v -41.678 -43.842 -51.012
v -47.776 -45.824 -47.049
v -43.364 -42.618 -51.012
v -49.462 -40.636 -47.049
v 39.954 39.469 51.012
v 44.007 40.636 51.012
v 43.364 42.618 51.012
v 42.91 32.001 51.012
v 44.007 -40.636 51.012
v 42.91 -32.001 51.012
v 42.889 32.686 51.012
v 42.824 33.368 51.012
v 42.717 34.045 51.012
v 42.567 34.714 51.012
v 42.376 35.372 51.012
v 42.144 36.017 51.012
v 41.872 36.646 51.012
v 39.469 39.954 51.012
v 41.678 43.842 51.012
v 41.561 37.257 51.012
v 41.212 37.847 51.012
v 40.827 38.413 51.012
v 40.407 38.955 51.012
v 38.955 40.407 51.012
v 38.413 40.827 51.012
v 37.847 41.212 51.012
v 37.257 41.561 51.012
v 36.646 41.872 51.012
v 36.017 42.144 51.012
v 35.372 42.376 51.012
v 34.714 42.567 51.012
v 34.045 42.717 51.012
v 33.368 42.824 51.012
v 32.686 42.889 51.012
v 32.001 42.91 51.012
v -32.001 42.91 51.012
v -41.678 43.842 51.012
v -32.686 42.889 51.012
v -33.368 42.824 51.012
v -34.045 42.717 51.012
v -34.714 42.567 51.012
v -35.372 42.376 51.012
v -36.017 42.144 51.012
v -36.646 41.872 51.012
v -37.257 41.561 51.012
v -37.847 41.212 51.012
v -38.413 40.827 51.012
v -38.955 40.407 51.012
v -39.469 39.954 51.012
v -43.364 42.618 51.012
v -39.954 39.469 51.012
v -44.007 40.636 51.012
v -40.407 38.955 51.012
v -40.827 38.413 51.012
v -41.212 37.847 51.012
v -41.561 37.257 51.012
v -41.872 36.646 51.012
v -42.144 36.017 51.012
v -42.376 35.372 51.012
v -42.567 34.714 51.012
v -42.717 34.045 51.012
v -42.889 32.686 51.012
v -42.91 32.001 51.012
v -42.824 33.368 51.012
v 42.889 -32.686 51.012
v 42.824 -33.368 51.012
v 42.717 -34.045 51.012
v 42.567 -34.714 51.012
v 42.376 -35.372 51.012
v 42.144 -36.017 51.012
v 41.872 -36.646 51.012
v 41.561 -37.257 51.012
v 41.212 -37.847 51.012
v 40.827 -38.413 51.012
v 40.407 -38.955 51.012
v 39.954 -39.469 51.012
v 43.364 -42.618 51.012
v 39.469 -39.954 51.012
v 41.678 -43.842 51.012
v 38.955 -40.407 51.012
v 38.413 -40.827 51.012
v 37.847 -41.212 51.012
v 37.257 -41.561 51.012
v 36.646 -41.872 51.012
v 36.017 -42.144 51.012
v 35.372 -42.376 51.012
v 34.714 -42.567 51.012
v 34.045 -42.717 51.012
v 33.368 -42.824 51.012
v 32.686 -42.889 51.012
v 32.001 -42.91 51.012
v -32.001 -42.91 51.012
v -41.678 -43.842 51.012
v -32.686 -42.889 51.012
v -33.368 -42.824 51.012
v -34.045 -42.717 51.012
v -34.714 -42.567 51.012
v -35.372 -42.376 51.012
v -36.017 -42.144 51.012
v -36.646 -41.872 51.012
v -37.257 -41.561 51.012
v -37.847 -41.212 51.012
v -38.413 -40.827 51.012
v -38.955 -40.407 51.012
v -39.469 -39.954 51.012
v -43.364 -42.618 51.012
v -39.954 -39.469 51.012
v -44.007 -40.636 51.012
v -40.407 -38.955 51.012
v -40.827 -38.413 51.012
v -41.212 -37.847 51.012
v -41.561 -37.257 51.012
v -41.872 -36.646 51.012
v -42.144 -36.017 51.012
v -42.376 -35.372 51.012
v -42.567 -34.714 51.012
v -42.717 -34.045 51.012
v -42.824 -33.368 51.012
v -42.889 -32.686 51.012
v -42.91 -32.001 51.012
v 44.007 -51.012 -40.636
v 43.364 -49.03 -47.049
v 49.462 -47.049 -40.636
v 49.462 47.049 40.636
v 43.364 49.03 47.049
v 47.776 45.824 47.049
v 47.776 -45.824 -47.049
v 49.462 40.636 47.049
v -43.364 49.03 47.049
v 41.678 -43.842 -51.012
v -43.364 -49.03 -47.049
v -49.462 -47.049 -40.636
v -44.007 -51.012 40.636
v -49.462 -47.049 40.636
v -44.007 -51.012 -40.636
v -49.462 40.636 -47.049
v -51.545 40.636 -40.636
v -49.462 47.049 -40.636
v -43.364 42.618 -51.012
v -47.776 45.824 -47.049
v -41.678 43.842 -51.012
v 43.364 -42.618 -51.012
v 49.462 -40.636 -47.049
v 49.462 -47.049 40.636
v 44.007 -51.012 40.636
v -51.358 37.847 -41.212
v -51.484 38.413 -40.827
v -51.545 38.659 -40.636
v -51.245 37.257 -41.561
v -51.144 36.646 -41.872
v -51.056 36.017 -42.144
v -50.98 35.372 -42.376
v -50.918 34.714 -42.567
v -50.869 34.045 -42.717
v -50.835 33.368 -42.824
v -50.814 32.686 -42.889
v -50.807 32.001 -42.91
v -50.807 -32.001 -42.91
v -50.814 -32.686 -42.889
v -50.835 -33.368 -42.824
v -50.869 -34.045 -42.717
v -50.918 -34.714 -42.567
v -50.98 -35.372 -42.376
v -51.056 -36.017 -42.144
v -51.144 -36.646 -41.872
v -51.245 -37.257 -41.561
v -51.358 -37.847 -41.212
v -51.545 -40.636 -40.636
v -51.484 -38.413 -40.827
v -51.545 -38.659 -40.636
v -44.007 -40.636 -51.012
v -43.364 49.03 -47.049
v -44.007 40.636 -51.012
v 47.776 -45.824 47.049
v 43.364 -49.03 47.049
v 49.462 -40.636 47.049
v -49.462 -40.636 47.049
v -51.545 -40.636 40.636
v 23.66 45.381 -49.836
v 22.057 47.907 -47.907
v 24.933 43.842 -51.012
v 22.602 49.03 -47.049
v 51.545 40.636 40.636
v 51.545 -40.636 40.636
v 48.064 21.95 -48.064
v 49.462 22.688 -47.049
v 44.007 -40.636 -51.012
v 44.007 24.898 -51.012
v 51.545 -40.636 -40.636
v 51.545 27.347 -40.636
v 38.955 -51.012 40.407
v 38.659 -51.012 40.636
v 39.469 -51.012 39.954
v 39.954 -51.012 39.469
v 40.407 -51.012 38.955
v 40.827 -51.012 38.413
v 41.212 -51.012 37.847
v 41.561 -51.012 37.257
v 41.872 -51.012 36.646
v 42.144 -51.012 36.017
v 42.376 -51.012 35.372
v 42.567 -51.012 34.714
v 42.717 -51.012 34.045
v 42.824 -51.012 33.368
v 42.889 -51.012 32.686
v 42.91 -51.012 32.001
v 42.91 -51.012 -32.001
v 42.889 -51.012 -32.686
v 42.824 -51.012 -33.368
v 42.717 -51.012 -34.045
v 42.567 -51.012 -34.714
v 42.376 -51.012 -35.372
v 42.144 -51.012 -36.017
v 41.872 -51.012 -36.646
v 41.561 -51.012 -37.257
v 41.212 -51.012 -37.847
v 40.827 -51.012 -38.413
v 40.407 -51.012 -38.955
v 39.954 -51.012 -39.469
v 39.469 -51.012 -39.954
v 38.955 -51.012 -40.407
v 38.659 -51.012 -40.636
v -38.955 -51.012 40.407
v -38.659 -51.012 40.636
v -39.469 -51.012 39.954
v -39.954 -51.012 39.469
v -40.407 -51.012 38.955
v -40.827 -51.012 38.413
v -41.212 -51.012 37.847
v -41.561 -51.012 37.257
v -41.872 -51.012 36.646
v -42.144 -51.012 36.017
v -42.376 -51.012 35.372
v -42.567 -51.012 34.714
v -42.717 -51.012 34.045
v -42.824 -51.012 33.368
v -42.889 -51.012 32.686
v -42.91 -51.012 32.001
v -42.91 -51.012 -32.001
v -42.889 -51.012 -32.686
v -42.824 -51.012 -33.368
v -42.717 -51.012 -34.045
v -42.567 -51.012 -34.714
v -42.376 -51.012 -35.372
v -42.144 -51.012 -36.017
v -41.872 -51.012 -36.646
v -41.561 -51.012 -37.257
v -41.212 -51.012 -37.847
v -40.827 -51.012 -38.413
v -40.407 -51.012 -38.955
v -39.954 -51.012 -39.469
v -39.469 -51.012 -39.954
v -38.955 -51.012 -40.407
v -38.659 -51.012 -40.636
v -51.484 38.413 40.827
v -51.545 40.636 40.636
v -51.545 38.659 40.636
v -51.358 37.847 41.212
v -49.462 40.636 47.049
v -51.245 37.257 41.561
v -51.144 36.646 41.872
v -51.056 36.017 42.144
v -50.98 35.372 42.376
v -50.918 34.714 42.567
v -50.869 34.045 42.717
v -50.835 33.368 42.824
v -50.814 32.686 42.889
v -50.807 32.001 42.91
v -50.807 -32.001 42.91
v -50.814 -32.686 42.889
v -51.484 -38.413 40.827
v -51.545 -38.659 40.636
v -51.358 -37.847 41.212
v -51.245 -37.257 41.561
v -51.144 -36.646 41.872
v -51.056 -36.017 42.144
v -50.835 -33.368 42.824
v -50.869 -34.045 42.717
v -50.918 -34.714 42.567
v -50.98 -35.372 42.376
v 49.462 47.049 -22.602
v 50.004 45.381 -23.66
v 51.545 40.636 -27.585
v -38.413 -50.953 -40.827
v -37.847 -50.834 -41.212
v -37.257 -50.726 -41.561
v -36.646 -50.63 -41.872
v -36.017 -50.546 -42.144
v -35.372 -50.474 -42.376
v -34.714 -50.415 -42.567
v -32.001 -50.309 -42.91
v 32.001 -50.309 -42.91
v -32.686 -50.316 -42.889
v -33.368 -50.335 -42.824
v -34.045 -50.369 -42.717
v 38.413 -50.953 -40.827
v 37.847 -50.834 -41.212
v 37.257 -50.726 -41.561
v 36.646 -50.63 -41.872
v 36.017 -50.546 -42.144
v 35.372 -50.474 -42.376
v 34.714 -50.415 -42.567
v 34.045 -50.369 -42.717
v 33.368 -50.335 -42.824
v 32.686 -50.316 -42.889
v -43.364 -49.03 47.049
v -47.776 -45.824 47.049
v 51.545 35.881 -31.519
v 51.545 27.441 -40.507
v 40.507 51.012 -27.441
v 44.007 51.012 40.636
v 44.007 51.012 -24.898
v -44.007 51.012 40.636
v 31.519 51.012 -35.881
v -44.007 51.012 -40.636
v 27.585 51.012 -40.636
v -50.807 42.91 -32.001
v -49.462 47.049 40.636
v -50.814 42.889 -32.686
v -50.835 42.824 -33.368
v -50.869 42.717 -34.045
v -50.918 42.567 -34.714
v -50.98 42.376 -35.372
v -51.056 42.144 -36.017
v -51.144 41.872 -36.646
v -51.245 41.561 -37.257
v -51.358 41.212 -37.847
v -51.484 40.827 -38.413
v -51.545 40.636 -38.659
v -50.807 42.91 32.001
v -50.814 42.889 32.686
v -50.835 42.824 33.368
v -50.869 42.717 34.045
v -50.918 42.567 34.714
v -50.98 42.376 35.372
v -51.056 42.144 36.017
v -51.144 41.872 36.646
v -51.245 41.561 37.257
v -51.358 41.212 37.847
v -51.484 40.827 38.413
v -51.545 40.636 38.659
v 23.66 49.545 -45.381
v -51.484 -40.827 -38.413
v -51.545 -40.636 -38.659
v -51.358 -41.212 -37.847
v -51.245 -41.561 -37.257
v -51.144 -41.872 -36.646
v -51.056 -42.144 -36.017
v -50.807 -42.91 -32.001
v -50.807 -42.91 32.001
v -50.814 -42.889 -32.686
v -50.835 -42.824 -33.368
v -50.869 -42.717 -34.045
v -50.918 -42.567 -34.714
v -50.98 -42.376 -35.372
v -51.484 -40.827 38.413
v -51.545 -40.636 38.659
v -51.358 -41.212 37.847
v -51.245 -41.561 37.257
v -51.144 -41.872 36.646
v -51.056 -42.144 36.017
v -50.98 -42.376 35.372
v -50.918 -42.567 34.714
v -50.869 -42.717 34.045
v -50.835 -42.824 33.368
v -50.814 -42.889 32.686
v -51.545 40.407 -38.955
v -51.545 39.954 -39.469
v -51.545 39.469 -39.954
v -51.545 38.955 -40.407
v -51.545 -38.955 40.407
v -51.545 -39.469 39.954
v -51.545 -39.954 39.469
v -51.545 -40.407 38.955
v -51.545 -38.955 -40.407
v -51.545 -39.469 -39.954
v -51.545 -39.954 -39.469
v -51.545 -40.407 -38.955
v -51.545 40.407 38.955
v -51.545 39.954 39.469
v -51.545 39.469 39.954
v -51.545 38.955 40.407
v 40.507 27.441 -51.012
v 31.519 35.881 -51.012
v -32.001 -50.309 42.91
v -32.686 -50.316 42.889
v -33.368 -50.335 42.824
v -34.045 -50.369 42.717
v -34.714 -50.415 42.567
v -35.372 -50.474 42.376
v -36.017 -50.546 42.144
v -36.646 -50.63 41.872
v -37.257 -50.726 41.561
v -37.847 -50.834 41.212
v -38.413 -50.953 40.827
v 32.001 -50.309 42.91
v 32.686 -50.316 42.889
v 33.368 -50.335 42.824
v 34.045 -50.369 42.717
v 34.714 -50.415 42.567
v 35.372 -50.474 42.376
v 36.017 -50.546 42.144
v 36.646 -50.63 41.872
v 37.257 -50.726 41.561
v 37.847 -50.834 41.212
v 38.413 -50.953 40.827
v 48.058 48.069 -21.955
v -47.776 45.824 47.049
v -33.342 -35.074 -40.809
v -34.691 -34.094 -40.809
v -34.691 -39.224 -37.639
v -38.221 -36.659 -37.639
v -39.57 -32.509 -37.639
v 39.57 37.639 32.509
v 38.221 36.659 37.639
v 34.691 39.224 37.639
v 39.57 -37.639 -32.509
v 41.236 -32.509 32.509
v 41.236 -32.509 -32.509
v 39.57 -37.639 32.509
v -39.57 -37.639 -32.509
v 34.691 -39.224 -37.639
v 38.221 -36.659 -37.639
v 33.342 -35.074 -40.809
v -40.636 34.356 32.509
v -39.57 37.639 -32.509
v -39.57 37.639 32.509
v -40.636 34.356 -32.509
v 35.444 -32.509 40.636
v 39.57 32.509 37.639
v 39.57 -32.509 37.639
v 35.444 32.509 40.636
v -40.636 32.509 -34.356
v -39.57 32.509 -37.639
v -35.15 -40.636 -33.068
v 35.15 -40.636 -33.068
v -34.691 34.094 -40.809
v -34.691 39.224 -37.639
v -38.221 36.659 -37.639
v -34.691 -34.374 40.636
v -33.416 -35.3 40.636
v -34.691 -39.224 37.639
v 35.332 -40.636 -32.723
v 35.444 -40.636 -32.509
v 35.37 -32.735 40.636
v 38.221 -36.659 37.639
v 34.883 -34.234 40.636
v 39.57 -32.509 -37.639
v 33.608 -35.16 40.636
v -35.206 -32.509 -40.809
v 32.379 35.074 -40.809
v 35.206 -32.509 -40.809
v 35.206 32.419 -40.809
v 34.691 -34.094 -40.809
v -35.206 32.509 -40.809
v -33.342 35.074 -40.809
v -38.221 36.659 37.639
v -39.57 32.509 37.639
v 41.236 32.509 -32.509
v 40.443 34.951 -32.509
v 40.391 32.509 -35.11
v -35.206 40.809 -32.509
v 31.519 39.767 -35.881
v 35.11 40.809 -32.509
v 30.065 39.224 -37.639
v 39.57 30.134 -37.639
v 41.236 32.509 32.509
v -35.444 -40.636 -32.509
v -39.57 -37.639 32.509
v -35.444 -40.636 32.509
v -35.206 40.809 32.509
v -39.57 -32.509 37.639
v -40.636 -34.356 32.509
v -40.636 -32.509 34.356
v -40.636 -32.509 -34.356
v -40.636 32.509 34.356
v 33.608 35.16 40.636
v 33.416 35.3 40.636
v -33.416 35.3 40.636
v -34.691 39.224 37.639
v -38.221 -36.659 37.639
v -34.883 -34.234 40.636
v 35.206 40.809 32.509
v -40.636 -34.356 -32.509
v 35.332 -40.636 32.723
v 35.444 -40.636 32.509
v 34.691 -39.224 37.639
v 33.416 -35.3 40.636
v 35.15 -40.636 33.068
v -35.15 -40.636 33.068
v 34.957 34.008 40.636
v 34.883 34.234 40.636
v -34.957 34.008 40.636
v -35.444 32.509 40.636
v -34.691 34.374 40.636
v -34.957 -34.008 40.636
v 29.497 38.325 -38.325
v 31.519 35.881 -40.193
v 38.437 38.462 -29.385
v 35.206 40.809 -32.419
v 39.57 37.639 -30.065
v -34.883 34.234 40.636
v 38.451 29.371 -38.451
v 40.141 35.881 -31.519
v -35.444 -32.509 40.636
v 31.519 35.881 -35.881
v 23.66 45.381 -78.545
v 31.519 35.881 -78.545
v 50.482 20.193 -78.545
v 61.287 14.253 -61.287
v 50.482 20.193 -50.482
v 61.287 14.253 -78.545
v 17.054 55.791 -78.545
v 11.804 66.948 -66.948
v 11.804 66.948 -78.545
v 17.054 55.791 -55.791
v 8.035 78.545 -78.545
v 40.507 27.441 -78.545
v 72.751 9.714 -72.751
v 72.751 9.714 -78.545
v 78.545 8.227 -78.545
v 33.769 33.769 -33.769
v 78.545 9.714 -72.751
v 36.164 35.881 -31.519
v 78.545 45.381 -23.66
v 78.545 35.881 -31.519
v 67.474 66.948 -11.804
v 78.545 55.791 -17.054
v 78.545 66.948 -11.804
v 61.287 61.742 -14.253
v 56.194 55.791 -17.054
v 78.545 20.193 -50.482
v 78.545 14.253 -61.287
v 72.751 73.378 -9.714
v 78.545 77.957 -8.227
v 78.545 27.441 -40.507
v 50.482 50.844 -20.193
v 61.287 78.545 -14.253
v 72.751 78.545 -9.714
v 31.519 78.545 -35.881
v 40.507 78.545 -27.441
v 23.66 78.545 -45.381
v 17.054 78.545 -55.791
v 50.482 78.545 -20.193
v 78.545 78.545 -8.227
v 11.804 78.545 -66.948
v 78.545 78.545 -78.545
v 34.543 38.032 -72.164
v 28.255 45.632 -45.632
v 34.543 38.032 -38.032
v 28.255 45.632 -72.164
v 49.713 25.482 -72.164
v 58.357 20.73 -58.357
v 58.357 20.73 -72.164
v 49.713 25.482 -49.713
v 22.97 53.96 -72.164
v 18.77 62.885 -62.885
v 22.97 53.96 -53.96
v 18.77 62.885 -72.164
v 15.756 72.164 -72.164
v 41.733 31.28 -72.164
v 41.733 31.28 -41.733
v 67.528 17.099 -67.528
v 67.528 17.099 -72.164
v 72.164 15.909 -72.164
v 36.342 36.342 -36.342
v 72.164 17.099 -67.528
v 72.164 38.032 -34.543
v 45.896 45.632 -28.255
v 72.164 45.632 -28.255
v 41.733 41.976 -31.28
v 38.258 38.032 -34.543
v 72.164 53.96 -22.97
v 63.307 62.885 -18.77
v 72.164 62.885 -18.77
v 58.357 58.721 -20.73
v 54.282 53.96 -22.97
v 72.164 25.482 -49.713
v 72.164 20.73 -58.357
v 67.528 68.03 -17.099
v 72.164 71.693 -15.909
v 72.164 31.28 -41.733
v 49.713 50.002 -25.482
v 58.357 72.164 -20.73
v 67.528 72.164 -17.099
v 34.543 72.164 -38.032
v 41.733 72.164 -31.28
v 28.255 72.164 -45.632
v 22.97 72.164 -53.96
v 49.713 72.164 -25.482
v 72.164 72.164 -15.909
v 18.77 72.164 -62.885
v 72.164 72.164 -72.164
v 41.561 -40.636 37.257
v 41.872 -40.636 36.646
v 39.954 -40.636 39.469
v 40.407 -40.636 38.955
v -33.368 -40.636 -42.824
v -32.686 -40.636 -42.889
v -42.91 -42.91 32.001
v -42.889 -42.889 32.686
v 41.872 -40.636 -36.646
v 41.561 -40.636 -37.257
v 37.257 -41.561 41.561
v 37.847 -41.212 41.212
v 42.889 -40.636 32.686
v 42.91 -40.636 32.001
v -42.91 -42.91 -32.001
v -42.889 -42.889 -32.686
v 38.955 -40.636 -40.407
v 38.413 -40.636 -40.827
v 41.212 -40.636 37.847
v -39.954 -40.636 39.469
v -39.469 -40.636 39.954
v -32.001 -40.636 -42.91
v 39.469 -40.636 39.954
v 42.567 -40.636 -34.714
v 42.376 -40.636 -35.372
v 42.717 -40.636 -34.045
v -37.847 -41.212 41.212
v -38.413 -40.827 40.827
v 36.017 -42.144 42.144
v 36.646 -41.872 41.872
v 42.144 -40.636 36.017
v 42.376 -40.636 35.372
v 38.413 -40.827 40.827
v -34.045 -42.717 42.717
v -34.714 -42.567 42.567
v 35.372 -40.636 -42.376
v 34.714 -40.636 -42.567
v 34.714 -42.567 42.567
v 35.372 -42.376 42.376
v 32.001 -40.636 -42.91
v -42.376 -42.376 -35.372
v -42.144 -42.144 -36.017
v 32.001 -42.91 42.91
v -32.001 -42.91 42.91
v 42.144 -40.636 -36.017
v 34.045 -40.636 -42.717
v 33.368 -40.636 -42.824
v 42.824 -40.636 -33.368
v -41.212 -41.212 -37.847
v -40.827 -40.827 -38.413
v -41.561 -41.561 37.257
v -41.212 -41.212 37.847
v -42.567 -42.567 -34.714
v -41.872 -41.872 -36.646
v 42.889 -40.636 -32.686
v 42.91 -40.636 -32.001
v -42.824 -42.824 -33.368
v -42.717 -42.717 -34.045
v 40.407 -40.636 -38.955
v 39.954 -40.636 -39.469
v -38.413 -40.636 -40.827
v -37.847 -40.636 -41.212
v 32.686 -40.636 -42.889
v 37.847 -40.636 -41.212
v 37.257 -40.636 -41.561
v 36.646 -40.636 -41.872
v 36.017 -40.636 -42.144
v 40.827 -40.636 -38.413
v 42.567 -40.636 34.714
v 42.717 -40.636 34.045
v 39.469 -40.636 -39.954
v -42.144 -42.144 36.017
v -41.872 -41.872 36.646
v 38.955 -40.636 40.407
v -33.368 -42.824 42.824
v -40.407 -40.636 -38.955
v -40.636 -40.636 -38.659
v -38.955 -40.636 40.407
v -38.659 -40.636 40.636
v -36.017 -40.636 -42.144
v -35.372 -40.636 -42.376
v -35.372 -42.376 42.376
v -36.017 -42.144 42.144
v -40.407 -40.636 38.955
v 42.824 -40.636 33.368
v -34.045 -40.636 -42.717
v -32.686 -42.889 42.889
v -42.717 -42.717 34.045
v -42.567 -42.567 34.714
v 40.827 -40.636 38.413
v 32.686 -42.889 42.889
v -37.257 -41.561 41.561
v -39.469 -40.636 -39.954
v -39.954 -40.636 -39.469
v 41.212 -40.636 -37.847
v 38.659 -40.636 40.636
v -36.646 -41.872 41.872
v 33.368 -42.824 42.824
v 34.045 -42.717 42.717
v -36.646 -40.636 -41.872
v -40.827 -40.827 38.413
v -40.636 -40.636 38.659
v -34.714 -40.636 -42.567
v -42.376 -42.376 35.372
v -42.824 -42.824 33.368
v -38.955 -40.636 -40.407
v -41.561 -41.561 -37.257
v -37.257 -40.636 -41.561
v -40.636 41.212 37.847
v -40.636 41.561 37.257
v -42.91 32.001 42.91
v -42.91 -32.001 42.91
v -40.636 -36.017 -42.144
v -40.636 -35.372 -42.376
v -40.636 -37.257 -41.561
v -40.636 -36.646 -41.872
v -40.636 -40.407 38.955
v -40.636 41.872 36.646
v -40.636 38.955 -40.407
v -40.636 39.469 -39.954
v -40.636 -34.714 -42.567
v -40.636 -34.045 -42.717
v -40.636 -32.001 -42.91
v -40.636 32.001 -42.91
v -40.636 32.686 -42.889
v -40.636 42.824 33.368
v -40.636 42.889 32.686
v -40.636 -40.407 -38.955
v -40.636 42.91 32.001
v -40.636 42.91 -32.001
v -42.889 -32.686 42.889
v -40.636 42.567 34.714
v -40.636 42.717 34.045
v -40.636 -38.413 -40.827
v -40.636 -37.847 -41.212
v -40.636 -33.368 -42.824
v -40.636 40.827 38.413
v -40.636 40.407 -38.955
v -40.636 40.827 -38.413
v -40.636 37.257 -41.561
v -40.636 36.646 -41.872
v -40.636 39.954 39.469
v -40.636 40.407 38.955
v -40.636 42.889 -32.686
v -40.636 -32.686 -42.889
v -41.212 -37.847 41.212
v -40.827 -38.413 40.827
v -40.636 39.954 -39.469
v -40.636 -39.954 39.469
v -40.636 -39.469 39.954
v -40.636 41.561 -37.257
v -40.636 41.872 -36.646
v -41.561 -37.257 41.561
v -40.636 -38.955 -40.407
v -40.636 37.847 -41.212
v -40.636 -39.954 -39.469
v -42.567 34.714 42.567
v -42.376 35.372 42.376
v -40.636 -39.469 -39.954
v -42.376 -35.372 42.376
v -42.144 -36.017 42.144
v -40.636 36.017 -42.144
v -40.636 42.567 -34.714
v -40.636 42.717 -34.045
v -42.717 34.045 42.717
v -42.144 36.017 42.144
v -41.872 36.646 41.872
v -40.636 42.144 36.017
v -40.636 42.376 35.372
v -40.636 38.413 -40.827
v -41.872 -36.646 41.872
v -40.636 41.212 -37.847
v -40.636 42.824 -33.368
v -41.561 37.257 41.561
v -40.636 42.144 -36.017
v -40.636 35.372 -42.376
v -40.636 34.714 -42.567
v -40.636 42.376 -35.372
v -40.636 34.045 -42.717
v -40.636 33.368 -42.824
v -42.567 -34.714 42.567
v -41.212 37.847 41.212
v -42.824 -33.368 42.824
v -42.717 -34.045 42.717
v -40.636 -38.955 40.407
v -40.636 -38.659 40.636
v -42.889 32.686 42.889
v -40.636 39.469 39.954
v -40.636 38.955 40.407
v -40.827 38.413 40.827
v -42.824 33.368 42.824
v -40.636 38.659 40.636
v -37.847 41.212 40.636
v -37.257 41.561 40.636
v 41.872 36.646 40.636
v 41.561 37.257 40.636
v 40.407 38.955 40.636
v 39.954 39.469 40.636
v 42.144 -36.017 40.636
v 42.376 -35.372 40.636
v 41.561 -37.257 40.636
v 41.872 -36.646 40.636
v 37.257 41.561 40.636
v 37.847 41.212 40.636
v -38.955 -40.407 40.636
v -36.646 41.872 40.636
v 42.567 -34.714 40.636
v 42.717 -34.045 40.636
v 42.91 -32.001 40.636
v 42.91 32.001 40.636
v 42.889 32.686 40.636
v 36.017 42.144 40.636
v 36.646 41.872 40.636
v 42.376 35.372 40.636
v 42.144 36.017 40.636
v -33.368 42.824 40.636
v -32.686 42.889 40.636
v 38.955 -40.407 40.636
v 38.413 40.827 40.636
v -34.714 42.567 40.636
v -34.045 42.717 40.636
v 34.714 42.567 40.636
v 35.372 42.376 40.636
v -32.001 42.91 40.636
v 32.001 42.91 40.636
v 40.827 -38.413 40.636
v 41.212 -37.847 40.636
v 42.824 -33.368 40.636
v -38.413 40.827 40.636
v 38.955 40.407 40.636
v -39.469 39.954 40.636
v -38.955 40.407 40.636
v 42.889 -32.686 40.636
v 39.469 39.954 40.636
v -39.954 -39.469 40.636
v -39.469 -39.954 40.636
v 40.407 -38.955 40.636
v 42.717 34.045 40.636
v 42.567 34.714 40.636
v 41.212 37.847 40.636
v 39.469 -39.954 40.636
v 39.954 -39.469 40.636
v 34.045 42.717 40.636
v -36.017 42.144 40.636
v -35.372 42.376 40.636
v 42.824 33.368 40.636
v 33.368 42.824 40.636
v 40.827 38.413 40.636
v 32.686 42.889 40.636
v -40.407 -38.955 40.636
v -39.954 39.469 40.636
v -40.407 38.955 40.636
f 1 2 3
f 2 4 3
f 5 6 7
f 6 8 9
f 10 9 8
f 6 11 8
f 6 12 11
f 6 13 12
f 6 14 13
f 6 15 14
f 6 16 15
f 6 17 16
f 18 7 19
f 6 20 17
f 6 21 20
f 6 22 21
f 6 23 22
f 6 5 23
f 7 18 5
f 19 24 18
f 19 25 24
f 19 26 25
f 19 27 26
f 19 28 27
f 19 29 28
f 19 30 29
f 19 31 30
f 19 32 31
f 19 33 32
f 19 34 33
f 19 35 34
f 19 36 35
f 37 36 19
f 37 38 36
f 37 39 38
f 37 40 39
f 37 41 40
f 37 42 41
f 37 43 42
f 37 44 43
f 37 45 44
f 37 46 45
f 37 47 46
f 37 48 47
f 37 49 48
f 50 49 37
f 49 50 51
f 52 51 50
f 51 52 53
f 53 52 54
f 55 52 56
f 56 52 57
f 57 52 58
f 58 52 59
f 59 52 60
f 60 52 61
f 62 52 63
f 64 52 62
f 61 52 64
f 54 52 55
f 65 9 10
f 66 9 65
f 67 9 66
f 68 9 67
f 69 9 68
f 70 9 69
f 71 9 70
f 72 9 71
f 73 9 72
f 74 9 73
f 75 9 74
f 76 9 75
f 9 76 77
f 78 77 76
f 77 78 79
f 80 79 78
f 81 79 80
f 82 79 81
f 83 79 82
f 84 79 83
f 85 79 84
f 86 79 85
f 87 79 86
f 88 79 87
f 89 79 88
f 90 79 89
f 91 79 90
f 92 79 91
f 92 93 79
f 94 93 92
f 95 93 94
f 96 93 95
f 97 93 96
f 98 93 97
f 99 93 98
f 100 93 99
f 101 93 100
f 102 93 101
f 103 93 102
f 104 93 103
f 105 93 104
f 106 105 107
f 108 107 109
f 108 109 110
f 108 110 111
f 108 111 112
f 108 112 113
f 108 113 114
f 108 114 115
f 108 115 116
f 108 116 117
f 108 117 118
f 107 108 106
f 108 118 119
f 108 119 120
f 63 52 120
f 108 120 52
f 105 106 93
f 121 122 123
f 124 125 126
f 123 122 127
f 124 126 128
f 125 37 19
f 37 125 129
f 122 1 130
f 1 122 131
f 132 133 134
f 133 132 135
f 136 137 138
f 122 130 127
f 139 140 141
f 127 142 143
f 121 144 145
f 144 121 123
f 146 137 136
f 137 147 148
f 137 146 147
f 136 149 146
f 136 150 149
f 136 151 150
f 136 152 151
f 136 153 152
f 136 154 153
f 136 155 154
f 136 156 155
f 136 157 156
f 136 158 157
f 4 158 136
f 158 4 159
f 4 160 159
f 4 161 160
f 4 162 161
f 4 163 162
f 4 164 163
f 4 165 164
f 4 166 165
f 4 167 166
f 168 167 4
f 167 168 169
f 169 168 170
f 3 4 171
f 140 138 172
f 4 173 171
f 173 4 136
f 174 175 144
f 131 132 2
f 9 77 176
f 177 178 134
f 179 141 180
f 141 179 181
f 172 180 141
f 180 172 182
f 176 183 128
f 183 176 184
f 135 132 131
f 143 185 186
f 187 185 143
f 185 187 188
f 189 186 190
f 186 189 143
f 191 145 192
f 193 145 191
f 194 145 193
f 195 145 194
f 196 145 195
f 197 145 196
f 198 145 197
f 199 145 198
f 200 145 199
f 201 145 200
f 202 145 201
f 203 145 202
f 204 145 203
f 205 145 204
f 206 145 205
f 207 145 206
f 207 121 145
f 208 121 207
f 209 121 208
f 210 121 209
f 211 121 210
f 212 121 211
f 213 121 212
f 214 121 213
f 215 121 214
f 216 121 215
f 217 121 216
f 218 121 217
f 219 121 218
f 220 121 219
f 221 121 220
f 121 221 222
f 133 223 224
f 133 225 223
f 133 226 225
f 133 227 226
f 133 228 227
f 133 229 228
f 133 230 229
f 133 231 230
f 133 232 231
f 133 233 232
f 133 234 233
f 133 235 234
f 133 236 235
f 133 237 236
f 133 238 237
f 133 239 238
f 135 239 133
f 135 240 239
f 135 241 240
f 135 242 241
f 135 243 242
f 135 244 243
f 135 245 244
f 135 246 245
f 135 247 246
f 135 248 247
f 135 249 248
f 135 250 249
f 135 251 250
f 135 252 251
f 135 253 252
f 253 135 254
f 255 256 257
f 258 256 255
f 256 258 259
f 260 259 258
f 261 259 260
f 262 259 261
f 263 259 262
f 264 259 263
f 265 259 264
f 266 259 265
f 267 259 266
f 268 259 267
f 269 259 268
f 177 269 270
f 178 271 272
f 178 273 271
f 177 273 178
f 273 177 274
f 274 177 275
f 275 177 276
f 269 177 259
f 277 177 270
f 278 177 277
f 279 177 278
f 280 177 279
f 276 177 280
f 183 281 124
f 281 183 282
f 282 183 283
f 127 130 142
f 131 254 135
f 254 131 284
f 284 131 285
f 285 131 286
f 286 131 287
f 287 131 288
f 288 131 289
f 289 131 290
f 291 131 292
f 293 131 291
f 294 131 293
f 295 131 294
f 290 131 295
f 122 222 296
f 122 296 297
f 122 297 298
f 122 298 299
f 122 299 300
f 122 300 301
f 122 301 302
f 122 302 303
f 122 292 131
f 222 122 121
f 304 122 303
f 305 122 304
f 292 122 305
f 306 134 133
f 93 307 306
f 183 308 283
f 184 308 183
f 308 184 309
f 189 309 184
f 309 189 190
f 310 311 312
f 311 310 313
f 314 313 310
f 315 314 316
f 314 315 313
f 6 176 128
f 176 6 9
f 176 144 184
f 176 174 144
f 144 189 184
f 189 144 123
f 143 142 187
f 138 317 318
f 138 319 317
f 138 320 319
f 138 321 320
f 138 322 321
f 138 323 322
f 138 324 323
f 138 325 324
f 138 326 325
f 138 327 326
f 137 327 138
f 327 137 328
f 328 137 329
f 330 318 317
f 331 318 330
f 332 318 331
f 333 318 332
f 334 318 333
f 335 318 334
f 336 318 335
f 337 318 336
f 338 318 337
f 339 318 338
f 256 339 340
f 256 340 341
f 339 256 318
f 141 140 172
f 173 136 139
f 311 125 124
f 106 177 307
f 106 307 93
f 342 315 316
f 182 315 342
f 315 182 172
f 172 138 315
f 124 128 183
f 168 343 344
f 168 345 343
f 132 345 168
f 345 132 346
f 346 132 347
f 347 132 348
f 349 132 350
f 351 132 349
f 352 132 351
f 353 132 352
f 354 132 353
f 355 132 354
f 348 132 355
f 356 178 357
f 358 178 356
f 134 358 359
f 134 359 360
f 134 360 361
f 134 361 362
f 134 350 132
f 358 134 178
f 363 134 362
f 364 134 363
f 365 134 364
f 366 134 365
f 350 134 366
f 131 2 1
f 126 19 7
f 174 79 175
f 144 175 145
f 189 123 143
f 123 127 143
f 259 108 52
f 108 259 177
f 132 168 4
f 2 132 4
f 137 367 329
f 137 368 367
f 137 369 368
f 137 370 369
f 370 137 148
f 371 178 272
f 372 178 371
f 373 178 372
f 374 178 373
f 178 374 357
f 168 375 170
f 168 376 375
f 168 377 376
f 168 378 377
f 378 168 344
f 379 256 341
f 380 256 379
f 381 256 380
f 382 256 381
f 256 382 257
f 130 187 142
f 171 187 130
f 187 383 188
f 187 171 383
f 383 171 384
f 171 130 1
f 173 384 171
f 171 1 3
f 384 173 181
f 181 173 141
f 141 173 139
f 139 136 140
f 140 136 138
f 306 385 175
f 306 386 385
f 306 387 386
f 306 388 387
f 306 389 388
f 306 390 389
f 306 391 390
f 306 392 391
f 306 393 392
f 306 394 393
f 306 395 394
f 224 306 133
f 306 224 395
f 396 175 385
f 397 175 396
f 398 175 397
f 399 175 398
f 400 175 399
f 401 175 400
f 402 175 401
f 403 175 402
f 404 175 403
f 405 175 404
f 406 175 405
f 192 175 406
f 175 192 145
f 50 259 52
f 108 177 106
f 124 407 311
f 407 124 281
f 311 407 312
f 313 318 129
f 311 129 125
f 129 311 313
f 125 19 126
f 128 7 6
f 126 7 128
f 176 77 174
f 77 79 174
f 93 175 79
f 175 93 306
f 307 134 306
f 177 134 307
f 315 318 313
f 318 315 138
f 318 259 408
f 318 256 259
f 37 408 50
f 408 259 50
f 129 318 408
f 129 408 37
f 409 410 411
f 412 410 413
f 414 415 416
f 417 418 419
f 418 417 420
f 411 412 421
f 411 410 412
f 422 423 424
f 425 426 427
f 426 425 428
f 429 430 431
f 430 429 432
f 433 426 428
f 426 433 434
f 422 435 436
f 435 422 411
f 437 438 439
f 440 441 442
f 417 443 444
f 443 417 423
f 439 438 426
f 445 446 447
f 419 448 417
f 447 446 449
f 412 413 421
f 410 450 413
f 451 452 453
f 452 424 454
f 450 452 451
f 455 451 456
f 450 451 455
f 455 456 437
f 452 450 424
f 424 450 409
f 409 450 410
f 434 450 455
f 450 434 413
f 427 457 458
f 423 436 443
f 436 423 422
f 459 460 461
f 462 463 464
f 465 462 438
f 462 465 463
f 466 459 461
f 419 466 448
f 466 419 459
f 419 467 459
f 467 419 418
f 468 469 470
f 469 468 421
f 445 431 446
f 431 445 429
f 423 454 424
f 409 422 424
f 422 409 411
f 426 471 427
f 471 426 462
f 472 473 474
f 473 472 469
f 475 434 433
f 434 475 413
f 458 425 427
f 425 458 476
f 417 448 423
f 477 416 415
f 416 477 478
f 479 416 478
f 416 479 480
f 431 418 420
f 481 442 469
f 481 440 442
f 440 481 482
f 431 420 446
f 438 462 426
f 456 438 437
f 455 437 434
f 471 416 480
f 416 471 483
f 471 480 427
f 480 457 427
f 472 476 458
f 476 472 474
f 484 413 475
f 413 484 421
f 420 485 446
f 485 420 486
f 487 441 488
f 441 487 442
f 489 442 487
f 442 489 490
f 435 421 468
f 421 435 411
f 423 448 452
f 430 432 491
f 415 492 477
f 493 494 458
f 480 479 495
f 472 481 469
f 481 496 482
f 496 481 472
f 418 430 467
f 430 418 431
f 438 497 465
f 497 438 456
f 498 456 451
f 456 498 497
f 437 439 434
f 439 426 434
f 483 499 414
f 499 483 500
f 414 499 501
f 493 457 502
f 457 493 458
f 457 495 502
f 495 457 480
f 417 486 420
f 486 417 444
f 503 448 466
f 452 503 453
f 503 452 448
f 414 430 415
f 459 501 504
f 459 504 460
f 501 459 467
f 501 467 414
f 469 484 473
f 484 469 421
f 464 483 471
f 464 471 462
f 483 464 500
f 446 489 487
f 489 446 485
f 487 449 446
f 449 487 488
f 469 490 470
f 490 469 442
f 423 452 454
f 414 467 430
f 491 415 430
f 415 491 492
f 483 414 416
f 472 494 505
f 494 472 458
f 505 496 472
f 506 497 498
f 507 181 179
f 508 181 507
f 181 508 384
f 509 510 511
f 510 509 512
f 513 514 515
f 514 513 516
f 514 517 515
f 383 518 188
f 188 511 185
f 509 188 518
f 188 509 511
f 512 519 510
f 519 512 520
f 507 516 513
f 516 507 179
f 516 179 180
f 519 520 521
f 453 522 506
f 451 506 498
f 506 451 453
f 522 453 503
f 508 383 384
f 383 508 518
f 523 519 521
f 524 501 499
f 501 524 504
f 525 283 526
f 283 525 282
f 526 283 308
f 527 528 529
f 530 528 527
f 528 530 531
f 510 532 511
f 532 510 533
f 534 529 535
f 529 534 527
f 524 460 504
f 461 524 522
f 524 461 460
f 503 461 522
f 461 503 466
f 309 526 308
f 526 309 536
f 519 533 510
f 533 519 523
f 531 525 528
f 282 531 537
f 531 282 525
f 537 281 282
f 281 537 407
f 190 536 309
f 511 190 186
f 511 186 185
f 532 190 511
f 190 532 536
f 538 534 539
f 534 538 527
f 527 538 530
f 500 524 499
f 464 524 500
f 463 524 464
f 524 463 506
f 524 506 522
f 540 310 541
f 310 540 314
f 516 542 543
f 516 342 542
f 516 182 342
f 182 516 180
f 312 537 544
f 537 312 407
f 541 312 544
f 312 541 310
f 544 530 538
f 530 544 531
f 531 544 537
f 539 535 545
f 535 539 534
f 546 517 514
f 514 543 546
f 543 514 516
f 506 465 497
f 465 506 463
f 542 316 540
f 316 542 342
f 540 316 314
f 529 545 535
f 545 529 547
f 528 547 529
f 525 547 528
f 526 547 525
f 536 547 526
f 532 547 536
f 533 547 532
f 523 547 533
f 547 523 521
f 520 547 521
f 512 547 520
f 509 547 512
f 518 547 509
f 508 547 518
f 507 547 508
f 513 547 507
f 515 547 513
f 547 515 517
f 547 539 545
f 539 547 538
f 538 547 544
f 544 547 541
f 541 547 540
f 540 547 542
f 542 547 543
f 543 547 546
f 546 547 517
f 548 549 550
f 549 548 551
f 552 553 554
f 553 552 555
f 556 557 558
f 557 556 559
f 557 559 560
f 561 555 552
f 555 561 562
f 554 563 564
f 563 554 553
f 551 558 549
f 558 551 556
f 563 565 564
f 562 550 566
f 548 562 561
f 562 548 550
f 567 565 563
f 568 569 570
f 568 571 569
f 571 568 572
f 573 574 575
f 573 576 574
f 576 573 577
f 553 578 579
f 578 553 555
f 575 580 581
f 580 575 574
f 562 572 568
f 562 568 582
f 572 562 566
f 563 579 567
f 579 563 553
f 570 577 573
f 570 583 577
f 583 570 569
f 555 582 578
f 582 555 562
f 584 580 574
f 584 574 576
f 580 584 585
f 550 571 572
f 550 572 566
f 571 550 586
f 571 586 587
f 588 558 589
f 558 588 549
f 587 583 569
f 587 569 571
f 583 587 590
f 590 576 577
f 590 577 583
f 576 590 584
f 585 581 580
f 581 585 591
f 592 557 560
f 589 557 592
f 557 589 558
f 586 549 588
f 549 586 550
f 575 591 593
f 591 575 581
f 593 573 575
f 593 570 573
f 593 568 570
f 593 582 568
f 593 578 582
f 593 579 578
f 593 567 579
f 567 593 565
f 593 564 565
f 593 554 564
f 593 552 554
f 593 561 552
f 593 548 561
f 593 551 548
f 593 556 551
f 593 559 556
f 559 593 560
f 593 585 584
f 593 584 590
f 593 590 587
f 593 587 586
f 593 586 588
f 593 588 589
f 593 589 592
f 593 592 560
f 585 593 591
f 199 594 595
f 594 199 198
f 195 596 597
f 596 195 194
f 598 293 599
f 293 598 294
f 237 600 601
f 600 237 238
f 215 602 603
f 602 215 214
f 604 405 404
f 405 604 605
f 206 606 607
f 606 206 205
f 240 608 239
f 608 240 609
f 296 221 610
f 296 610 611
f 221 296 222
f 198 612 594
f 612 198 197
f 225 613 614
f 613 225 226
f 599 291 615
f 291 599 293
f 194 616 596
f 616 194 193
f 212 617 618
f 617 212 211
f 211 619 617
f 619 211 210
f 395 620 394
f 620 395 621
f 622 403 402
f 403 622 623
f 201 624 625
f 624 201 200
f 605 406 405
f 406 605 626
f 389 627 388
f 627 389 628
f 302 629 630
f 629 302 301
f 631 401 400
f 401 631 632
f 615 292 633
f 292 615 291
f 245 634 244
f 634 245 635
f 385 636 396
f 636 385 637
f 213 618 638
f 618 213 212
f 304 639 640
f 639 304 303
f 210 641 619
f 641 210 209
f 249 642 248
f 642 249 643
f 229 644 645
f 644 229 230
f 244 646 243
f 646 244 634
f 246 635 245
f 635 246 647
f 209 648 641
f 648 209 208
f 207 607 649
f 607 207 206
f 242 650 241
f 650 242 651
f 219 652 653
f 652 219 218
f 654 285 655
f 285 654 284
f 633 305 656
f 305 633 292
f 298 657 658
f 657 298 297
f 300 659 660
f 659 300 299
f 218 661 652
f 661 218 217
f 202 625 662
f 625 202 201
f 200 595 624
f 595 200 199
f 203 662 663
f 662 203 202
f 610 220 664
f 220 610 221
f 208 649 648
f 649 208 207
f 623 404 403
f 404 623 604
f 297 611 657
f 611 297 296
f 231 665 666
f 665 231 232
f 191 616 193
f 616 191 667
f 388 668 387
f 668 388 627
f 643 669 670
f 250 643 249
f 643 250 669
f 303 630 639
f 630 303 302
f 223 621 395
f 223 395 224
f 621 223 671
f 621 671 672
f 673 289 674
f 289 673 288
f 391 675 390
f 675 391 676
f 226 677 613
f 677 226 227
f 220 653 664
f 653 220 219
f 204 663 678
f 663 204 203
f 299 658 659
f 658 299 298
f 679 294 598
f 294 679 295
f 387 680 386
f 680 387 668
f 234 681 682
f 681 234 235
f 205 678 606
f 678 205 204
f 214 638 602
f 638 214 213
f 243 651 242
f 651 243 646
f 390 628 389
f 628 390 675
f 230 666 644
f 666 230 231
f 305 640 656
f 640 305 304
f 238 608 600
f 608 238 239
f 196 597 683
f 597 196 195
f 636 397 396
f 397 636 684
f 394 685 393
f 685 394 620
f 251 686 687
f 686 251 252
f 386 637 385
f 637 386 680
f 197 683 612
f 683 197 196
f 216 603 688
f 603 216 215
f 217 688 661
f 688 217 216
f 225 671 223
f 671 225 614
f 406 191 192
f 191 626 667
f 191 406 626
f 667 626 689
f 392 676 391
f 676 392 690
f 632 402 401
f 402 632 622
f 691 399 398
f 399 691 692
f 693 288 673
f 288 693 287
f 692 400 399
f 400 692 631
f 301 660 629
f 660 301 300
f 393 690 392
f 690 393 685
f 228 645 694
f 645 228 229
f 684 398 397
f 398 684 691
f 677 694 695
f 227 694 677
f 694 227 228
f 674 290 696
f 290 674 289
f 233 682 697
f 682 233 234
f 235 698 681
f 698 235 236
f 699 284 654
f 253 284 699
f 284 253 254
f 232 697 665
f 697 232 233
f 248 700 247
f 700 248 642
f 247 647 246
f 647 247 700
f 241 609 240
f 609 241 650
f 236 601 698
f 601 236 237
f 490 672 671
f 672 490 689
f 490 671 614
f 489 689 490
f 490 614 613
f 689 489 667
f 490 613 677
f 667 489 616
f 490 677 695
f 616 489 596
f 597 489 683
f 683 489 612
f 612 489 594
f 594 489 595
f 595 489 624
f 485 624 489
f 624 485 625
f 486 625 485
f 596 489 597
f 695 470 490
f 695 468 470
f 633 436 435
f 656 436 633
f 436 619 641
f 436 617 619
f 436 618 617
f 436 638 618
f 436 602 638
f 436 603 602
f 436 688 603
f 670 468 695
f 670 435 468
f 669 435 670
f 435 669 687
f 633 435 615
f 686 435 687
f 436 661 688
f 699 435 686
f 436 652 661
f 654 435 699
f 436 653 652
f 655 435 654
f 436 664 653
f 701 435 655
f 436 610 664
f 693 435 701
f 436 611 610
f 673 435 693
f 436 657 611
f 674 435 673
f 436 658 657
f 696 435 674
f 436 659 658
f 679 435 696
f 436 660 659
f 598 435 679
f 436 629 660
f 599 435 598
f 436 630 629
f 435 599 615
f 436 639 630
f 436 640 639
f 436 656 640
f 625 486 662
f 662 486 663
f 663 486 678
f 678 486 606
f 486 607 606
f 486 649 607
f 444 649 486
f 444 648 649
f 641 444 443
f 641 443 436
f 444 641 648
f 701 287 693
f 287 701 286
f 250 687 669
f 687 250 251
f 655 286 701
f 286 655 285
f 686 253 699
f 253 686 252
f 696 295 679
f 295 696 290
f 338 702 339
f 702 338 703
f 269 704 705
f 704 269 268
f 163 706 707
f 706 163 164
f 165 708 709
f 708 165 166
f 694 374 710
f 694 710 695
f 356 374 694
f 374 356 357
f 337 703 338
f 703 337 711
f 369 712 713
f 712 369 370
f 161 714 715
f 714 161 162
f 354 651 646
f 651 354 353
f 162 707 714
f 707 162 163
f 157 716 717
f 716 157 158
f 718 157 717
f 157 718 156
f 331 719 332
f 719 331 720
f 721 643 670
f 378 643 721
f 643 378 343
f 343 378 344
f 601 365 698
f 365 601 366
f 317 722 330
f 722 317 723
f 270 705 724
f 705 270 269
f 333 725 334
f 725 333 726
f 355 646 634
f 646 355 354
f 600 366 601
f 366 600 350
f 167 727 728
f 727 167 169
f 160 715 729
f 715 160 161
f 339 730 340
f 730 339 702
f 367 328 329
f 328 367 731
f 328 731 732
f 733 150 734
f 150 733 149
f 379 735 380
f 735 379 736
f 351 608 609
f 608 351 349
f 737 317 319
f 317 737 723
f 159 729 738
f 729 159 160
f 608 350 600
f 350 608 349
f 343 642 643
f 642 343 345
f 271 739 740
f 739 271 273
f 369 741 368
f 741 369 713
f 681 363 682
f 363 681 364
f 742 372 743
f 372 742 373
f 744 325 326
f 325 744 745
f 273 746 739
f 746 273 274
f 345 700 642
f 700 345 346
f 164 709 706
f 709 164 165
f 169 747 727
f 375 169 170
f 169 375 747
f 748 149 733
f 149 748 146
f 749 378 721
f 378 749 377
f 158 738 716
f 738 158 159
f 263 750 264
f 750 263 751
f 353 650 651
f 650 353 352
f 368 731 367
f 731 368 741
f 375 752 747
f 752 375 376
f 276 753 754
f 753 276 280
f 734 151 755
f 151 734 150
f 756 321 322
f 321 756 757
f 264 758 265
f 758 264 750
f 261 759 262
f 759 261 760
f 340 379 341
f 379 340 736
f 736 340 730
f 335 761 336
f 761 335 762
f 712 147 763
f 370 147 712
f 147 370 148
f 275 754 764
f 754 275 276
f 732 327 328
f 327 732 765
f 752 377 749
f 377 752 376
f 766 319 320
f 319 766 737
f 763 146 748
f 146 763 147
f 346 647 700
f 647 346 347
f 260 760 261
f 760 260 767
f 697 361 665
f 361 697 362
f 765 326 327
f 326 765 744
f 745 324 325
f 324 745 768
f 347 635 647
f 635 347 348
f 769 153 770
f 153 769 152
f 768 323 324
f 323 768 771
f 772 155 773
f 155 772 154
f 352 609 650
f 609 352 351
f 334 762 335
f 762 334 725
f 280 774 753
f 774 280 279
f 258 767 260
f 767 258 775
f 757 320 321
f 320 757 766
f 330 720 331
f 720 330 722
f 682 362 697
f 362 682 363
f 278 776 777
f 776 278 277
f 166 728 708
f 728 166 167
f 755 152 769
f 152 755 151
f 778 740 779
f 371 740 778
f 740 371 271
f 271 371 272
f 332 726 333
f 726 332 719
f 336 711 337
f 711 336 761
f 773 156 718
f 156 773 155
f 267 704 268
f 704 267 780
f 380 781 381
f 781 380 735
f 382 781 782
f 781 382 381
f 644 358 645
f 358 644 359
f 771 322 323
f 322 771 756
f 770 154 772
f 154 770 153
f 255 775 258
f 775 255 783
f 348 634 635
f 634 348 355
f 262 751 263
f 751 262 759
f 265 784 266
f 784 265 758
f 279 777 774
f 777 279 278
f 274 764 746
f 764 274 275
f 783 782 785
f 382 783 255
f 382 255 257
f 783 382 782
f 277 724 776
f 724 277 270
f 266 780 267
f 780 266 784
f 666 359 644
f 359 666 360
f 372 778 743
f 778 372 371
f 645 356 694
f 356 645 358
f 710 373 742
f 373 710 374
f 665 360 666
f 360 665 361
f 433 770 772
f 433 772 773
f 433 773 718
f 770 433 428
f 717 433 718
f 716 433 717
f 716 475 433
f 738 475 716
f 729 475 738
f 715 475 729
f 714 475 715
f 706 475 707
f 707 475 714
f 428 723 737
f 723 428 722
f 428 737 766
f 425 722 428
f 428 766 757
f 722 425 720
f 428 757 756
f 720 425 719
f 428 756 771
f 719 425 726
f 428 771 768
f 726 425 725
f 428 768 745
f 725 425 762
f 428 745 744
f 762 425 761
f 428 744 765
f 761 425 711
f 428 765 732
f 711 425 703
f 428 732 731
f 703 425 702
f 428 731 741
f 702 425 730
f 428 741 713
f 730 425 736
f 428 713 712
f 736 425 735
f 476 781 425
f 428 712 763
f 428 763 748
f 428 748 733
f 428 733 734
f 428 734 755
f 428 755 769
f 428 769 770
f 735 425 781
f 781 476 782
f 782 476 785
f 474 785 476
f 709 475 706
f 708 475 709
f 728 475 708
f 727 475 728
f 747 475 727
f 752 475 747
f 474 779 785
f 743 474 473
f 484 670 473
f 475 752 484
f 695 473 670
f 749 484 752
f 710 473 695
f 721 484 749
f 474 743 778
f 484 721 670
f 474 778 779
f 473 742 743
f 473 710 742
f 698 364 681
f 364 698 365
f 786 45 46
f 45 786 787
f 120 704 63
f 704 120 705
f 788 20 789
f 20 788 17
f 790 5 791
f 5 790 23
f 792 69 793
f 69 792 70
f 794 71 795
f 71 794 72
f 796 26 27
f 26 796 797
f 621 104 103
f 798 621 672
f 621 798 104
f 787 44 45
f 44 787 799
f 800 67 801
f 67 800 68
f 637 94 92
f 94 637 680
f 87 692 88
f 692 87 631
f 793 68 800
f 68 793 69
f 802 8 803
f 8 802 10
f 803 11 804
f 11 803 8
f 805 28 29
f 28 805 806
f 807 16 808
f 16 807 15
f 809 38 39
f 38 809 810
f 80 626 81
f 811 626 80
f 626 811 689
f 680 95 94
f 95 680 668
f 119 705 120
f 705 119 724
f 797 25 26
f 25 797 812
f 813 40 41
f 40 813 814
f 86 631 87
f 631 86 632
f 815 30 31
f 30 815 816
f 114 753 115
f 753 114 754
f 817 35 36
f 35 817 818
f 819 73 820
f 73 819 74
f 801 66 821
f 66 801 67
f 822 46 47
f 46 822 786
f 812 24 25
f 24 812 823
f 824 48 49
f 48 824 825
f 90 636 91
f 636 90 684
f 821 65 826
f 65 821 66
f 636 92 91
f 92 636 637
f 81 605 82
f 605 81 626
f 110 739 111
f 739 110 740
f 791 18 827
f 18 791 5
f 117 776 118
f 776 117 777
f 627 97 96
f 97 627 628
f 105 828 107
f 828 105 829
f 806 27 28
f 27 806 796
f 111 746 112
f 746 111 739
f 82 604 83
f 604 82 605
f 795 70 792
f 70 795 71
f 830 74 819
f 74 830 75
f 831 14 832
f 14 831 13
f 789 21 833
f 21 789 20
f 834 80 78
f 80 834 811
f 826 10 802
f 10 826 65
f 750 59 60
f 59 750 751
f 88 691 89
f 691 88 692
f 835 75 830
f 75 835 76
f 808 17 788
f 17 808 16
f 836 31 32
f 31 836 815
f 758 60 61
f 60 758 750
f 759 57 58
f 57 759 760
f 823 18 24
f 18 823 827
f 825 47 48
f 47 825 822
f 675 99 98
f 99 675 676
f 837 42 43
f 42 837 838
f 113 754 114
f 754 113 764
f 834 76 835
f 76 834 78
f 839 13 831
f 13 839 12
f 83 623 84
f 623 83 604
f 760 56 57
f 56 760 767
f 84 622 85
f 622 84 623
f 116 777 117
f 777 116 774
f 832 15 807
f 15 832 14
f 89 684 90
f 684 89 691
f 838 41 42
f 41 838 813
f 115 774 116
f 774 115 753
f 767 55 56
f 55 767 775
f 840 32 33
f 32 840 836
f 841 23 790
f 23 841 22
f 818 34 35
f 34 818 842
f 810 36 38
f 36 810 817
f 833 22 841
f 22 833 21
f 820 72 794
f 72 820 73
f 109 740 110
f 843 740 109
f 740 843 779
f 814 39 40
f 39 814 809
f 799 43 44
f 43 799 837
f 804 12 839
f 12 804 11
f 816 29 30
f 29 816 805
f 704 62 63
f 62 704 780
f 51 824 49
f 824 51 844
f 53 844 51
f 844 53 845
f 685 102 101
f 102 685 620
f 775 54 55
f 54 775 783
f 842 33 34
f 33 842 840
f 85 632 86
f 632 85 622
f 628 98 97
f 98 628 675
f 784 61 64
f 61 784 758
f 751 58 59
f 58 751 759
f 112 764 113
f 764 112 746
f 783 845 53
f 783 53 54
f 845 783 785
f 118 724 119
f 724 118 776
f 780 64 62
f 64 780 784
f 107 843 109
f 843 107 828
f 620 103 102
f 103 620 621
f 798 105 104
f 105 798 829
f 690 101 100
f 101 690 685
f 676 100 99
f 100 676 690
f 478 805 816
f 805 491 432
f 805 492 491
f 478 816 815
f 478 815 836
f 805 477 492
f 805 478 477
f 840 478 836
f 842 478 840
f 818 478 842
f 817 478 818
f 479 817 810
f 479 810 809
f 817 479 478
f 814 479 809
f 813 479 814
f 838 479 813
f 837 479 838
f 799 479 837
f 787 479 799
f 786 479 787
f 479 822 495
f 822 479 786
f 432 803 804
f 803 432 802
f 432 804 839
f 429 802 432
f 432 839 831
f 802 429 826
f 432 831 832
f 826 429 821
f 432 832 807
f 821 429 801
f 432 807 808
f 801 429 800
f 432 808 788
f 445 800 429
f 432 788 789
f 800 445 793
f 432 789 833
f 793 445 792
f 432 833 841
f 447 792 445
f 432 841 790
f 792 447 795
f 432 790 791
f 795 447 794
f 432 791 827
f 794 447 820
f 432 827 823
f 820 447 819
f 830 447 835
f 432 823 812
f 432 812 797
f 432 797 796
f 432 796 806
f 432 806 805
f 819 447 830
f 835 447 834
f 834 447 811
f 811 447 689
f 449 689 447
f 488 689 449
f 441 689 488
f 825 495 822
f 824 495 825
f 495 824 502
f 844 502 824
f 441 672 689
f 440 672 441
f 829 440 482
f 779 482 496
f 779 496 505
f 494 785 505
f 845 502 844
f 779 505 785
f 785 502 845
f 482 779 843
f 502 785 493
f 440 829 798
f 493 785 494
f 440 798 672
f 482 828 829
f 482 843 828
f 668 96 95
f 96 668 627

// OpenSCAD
// file: variables.scad
$fn=50;

scale_factor = 300/55;

CUBIE=18.9*scale_factor; //total side length of each cube piece (including rounded edges)
CORE=18*scale_factor;
SCREW_TIP=1.5*scale_factor;
SCREW_BODY=2*scale_factor;
SCREW_HEAD=3.8*scale_factor;
INNER=4.5*scale_factor;
SPRING=3.2*scale_factor;
ROUND=2*scale_factor; //radius of rounded edges
DEPTH=6*scale_factor;
RAFT=5*scale_factor;
LAYER=0.3*scale_factor;
GAP=0.25*scale_factor;

core_height = 20 * scale_factor;
core_radius = 3 * scale_factor;

WITH_SUPPORT=false;
WITH_RAFT=false;

inner_cubie=(CUBIE-2*ROUND); //length of each cube before rounded edges

tile_length = inner_cubie*0.75;
tile_height = 1 * scale_factor;

module tile(length, height) {
	translate([-length/2,-length/2,0]) {
		minkowski(){
			translate([0,0,-height/2]) cube([length,length,height]);
			cylinder(r=ROUND,h=height,center=true);
		}
	}
	
}

module cubie() {
    translate([-inner_cubie/2,-inner_cubie/2, -inner_cubie/2])
    minkowski() {
        cube([inner_cubie, inner_cubie, inner_cubie]);
        sphere(r=ROUND, $fn=10);
    }
}

module disc() {
    cylinder(CUBIE, r1=CORE, r2=CORE, $fn=50, center=true);

}

module disc2() {
    cylinder(CUBIE*10, r1=CORE, r2=CORE, $fn=50, center=true);

}

module icore() {
    disc();
    rotate([0,90,0])
        disc();
    rotate([90,0,0])
        disc();
}

module core2() {
    intersection() {
        disc2();
        rotate([0,90,0])
            disc2();
        rotate([90,0,0])
            disc2();
    }
}

module screw() {
    translate([5.2,0,0])
    rotate([0,90,0]) {
        cylinder(11.7,r1=SCREW_BODY,r2=SCREW_BODY,$fn=10,center=true);
        translate([0,0,-11.7/2-1.7/2])
            cylinder(1.7,r1=SCREW_HEAD,r2=SCREW_HEAD,$fn=10,center=true);
        translate([0,0,11.7/2+5.7/2])
            cylinder(5.7,r1=SCREW_TIP,r2=SCREW_TIP,$fn=10,center=true);
    }
}
// main file
include <variables.scad>

//$fa=1;
$fn=100;

module corner() {
	difference() {
		difference() {
			difference() {
    			union() {
			        difference() {
			            cubie();
                        scale([0.8,0.8,0.8]) cubie();
			        }
			 
			        difference() {
                        intersection() {
                            cube([CUBIE+(CUBIE-2*INNER),CUBIE+(CUBIE-2*INNER),CUBIE+(CUBIE-2*INNER)],center=true);
                            translate([CUBIE,CUBIE,-CUBIE])
                                core2();
                        }
                        
                        
                        translate([(CORE-CUBIE/2)*0.2,(CORE-CUBIE/2)*0.2,(CORE-CUBIE/2)*-0.2])
                        scale([0.8,0.8,0.8])
                        intersection() {
                            cube([CUBIE+(CUBIE-2*INNER),CUBIE+(CUBIE-2*INNER),CUBIE+(CUBIE-2*INNER)],center=true);
                            translate([CUBIE,CUBIE,-CUBIE])
                                core2();
                        }
                    }

			   }
				translate([0,-CUBIE/2 + tile_height,0])
				rotate(v=[1,0,0],a=90)
				tile(tile_length*1.05,tile_height);
			}
			translate([-CUBIE/2 + tile_height,0,0])
			rotate(v=[0,1,0],a=90)
			tile(tile_length*1.05,tile_height);
		}
		translate([0,0,CUBIE/2 - tile_height])
		tile(tile_length*1.05,tile_height);
	}
			
	if (WITH_RAFT)
   raft();
   if (WITH_SUPPORT)
   corner_support();

}
/*difference(){
    corner();
    translate([-55,-55,0])cube(60);
}*/
/*
difference(){
    corner();
    cube(CUBIE,CUBIE,CUBIE,center=true);
}*/
difference() {
    corner();
    translate([(CORE-CUBIE/2)*0.2,(CORE-CUBIE/2)*0.2,(CORE-CUBIE/2)*-0.2])
    scale([0.8,0.8,0.8])
    intersection() {
		cube([CUBIE+(CUBIE-2*INNER),CUBIE+(CUBIE-2*INNER),CUBIE+(CUBIE-2*INNER)],center=true);
		translate([CUBIE,CUBIE,-CUBIE])
		core2();
    }
}
